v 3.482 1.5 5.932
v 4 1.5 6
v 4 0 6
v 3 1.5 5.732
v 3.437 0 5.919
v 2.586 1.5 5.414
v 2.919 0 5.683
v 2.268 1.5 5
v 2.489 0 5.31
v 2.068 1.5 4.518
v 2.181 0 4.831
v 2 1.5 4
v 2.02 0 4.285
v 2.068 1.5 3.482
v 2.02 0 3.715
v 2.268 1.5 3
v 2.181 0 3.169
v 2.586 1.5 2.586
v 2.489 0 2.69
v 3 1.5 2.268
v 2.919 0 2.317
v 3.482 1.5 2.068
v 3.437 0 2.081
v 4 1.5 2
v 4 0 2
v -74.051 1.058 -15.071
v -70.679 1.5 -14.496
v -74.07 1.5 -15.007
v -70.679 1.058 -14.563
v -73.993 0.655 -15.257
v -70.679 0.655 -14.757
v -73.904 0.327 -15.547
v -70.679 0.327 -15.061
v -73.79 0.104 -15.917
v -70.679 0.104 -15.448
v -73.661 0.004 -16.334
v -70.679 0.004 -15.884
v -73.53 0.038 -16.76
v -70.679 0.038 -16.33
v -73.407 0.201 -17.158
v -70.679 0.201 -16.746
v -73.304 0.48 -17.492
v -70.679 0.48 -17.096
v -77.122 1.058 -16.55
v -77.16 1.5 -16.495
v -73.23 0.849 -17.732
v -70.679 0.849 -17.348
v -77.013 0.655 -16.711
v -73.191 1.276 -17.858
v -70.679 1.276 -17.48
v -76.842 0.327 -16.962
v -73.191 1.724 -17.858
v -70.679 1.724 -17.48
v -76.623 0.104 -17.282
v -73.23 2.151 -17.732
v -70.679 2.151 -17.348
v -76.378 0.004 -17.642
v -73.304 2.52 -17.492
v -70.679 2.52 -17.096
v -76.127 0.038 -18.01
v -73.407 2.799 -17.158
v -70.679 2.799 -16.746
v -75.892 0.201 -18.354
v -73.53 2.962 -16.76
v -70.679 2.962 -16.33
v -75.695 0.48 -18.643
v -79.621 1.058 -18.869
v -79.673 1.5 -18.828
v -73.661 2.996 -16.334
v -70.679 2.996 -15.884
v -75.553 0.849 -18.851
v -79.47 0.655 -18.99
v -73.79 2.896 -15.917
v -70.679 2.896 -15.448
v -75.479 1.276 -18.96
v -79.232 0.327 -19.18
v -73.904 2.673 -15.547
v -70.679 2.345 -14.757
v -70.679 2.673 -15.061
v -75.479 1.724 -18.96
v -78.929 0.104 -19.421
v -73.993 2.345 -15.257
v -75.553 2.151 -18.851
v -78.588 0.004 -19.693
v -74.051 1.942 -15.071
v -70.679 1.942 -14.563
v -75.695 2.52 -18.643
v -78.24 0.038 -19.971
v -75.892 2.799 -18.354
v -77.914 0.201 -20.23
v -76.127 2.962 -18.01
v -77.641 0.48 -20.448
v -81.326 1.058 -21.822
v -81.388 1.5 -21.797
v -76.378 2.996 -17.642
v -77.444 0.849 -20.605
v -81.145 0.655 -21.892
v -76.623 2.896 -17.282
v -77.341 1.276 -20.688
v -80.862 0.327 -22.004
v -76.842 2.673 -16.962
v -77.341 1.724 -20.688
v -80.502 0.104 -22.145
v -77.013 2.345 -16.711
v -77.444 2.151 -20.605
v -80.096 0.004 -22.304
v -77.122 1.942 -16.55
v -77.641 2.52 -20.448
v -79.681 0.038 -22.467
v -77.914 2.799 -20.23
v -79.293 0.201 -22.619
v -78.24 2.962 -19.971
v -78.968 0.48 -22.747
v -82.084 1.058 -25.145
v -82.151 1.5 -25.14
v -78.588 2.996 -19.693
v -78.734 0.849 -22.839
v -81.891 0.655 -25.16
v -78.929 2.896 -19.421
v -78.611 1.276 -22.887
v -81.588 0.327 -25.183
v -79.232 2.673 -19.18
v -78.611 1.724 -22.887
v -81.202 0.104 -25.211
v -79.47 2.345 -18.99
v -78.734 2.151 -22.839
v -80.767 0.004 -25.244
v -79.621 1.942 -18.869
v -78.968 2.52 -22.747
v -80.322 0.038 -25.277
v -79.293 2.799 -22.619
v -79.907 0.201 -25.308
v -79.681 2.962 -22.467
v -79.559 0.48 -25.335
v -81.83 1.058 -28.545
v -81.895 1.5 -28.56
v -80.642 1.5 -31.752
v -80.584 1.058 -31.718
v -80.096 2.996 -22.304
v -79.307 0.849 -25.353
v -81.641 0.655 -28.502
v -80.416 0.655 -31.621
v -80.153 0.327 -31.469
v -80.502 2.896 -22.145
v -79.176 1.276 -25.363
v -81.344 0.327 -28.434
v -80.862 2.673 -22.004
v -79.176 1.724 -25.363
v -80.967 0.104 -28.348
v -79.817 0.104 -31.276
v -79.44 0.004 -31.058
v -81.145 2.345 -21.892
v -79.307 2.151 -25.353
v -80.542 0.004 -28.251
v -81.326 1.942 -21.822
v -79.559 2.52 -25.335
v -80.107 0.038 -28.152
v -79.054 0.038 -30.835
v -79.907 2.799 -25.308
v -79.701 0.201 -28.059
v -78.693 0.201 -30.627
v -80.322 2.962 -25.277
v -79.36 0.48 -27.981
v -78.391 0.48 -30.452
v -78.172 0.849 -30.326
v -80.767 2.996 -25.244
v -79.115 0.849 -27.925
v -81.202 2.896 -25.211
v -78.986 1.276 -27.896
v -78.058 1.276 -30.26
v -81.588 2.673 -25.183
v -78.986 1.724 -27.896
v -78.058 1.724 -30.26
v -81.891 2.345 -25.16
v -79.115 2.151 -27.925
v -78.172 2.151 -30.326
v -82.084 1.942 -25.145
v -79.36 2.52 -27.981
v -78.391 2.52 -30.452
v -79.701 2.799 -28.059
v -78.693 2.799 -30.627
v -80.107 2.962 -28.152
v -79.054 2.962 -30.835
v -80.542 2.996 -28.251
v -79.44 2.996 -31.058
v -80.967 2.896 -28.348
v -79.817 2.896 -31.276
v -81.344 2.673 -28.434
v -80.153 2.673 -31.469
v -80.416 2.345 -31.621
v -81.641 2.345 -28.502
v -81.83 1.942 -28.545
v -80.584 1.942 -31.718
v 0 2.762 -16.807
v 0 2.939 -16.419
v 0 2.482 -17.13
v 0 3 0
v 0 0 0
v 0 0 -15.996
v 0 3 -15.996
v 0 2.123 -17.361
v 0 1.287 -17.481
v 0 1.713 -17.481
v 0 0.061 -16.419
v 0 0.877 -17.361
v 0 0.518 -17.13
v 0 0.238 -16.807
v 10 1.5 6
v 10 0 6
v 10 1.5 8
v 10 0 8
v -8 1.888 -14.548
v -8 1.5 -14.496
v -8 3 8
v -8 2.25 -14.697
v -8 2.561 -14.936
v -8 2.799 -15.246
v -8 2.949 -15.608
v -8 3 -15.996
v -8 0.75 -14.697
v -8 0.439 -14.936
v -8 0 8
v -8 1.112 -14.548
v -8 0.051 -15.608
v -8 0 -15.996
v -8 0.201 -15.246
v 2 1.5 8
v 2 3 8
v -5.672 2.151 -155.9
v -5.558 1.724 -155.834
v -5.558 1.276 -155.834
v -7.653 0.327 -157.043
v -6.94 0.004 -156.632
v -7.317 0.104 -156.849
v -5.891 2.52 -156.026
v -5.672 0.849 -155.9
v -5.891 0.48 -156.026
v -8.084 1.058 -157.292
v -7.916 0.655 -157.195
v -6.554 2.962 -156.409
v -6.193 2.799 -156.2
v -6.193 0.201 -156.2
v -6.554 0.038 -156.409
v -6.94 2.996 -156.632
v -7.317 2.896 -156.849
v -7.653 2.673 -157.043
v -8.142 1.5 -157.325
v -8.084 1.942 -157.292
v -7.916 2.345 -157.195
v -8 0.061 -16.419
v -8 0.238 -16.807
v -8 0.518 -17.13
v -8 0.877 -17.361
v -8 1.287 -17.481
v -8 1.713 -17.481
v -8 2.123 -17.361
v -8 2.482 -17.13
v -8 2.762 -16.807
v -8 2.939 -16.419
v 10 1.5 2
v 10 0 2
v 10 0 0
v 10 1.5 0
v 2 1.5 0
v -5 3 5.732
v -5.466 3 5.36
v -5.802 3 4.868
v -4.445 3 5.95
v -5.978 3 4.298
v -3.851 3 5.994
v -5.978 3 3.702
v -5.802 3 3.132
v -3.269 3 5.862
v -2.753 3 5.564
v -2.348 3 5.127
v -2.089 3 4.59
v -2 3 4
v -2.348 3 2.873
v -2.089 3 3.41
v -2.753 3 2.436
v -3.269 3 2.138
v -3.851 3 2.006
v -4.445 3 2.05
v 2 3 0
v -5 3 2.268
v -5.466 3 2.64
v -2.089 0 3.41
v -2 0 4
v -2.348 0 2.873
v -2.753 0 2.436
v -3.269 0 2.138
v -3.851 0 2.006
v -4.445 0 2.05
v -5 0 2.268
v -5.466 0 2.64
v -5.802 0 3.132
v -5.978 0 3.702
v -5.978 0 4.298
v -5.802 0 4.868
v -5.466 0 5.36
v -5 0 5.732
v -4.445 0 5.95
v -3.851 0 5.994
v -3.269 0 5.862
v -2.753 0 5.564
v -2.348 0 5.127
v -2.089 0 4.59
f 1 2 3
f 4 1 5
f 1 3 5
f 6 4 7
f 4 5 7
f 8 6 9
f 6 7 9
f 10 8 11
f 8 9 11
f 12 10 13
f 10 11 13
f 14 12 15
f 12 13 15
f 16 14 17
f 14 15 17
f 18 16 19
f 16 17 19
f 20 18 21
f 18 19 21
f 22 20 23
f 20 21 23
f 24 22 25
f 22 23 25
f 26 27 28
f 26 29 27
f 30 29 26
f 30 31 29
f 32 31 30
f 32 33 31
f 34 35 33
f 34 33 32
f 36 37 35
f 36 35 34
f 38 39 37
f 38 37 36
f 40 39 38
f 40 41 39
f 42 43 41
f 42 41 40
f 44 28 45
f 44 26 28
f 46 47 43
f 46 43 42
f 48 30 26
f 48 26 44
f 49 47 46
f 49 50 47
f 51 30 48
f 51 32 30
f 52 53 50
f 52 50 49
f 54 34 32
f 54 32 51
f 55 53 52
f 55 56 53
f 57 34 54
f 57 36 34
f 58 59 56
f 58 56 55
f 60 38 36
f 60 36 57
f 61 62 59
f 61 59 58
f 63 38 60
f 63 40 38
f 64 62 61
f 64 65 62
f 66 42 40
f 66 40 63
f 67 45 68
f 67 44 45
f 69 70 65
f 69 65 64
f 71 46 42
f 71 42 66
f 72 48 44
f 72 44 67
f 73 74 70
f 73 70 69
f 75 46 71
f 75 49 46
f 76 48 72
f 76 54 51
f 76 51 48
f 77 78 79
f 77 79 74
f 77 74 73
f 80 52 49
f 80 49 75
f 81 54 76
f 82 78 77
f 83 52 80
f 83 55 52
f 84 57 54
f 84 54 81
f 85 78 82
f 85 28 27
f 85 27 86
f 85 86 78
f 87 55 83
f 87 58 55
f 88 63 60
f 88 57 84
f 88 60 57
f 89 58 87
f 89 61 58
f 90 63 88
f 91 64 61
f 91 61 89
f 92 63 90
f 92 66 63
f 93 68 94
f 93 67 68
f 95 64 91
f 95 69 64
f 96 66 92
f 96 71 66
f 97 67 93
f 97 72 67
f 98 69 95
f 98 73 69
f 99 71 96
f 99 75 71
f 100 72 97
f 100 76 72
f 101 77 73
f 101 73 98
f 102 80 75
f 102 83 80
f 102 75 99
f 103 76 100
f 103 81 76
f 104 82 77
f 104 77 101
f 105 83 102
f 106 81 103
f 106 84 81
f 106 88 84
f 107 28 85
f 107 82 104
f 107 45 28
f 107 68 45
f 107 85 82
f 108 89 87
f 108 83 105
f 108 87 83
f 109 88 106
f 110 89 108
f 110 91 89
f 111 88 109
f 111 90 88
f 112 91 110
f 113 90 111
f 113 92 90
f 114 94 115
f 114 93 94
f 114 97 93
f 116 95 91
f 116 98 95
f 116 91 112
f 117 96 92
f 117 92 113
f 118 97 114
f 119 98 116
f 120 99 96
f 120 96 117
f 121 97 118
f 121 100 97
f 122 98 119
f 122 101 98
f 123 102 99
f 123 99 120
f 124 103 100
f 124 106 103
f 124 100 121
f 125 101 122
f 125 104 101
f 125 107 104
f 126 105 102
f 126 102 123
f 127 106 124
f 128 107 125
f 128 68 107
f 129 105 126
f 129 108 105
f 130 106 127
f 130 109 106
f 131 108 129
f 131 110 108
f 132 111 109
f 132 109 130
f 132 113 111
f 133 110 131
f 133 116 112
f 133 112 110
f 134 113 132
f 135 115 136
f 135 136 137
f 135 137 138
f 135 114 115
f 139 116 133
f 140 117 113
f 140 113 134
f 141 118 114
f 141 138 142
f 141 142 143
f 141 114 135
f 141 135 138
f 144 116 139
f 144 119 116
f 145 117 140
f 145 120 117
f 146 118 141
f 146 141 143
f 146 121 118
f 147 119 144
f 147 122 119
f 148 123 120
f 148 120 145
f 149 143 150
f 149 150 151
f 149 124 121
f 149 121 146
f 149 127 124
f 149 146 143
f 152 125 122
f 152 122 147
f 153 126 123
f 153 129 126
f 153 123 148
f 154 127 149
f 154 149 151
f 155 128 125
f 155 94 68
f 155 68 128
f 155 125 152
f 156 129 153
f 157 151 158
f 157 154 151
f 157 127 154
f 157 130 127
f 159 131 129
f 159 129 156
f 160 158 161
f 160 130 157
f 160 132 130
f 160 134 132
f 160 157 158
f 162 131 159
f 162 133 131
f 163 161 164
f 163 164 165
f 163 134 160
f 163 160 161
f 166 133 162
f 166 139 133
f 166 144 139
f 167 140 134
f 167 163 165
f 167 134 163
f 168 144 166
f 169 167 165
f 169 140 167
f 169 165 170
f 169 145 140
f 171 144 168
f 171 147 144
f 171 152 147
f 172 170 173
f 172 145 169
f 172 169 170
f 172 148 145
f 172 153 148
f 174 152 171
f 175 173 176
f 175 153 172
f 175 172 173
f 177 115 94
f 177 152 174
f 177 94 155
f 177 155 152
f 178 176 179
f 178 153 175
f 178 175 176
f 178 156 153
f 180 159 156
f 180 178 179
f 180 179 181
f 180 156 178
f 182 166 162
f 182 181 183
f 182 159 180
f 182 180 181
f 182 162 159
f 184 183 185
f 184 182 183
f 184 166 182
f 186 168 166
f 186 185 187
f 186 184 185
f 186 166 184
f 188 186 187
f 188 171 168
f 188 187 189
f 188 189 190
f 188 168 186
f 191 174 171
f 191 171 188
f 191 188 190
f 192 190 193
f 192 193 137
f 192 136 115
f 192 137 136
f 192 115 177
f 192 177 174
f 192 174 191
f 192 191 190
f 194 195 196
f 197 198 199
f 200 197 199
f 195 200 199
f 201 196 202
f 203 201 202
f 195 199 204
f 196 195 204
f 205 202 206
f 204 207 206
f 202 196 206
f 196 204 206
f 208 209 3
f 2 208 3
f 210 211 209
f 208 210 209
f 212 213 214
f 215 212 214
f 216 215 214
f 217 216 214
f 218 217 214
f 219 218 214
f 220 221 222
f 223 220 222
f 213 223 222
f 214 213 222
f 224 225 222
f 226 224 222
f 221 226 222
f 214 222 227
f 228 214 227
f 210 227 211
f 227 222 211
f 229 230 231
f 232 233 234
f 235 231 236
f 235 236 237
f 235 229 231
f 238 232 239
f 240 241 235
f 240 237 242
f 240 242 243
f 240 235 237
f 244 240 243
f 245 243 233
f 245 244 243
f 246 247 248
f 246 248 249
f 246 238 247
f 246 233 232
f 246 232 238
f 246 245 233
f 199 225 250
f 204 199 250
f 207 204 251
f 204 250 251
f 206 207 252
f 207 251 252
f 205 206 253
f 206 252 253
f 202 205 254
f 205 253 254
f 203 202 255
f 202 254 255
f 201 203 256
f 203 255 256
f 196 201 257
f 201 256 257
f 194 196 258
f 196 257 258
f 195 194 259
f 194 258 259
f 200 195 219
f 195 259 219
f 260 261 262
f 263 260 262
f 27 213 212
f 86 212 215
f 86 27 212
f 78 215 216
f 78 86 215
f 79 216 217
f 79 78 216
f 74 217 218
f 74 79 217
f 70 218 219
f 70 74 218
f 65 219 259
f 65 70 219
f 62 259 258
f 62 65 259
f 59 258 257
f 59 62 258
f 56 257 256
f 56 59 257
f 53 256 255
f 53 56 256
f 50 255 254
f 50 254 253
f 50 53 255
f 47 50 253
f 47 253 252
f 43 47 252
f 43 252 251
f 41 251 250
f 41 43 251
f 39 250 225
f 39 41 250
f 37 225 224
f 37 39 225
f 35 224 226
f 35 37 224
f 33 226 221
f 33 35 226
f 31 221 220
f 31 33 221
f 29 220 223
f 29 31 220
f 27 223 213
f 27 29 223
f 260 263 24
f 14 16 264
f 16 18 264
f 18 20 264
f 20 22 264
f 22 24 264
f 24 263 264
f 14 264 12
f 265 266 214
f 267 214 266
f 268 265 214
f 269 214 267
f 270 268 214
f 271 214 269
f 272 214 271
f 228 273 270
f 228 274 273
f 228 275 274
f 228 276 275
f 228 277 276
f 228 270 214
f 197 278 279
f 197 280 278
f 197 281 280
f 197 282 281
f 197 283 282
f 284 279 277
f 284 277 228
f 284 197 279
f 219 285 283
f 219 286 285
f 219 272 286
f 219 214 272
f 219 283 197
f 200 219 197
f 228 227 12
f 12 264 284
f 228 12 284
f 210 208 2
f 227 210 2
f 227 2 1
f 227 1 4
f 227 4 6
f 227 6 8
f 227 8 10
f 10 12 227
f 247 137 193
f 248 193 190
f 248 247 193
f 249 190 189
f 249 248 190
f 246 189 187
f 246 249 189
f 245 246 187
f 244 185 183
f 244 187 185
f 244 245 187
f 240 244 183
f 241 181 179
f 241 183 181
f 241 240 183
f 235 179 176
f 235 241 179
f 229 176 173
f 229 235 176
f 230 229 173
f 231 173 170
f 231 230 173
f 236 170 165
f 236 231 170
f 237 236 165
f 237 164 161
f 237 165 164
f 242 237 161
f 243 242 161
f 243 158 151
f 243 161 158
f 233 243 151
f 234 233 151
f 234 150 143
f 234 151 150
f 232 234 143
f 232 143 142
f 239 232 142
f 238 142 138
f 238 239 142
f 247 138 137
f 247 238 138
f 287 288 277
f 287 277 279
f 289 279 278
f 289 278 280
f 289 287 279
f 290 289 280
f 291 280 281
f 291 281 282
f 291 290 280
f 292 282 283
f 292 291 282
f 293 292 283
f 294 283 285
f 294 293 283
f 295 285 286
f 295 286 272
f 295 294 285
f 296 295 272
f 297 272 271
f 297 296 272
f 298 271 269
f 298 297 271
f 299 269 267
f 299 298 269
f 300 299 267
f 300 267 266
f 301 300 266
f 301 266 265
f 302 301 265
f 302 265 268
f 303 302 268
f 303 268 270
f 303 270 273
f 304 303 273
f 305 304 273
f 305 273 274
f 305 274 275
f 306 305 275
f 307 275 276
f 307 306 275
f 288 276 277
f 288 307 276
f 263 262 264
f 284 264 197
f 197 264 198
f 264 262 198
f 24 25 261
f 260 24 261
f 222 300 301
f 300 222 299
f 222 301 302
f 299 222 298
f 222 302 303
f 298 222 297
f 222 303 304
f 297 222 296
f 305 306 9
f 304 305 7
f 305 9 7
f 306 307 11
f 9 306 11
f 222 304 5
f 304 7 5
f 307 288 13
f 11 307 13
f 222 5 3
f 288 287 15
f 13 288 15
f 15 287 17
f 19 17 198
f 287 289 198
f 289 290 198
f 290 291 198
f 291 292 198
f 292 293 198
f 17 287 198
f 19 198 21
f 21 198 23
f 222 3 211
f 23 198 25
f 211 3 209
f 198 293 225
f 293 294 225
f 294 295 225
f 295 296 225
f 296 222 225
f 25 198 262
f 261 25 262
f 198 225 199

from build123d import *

# Parameters (mm, degrees)
SKETCH1_R           = 2
BOSS_EXTRUDE1_DEPTH = 3
SKETCH3_R           = 1.5
SKETCH4_W           = 8
SKETCH4_H           = 1.5
CUT_EXTRUDE1_DEPTH  = 10
CUT_EXTRUDE2_DEPTH  = 10


with BuildPart() as part:
    # Sketch1 → Boss-Extrude1 (new body)
    with BuildSketch(Plane(origin=(0, 0, 0), x_dir=(1, 0, 0), z_dir=(0, 1, 0))):
        with BuildLine():
            Line((0, 0), (0, 20))
            Line((0, 20), (-8, 20))
            Line((-8, 20), (-8, -8))
            Line((-8, -8), (10, -8))
            Line((10, -8), (10, -6))
            Line((10, -6), (4, -6))
            ThreePointArc((4, -6), (2, -4), (4, -2))
            Line((4, -2), (10, -2))
            Line((10, -2), (10, 0))
            Line((10, 0), (0, 0))
        make_face()
        with Locations((-4, -4)):
            Circle(SKETCH1_R, mode=Mode.SUBTRACT)
    extrude(amount=BOSS_EXTRUDE1_DEPTH)

    # Sweep1: sweep along a path in Sketch2
    with BuildLine(Plane(origin=(0, 1.5, 0), x_dir=(1, 0, 0), z_dir=(0, 1, 0))) as sweep1_path:
        Line((-8, 16), (-70.679491924, 16))
        ThreePointArc((-70.679491924, 16), (-79.339745962, 21), (-79.339745962, 31))
        Line((-79.339745962, 31), (-6.839745962, 156.573683549))
    # Sketch3 → Sweep1 (sweep)
    with BuildSketch(Plane.ZY.offset(8)):
        with Locations((-15.996391196, 1.5)):
            Circle(SKETCH3_R)
    sweep(path=sweep1_path.line)

    # Sketch4 → Cut-Extrude1 (cut)
    with BuildSketch(Plane(origin=(0, 0, 0), x_dir=(-1, 0, 0), z_dir=(0, 0, -1))):
        with Locations((-6, 2.25)):
            Rectangle(SKETCH4_W, SKETCH4_H)
    extrude(amount=-CUT_EXTRUDE1_DEPTH, mode=Mode.SUBTRACT)

    # Sketch5 → Cut-Extrude2 (cut)
    with BuildSketch(Plane.ZY.offset(8)):
        with BuildLine():
            Line((-15.996391196, 3), (-20, 3))
            Line((-20, 3), (-20, 0))
            Line((-20, 0), (-15.996391196, 0))
            ThreePointArc((-15.996391196, 0), (-17.496391196, 1.5), (-15.996391196, 3))
        make_face()
    extrude(amount=-CUT_EXTRUDE2_DEPTH, mode=Mode.SUBTRACT)


solid = part.part
